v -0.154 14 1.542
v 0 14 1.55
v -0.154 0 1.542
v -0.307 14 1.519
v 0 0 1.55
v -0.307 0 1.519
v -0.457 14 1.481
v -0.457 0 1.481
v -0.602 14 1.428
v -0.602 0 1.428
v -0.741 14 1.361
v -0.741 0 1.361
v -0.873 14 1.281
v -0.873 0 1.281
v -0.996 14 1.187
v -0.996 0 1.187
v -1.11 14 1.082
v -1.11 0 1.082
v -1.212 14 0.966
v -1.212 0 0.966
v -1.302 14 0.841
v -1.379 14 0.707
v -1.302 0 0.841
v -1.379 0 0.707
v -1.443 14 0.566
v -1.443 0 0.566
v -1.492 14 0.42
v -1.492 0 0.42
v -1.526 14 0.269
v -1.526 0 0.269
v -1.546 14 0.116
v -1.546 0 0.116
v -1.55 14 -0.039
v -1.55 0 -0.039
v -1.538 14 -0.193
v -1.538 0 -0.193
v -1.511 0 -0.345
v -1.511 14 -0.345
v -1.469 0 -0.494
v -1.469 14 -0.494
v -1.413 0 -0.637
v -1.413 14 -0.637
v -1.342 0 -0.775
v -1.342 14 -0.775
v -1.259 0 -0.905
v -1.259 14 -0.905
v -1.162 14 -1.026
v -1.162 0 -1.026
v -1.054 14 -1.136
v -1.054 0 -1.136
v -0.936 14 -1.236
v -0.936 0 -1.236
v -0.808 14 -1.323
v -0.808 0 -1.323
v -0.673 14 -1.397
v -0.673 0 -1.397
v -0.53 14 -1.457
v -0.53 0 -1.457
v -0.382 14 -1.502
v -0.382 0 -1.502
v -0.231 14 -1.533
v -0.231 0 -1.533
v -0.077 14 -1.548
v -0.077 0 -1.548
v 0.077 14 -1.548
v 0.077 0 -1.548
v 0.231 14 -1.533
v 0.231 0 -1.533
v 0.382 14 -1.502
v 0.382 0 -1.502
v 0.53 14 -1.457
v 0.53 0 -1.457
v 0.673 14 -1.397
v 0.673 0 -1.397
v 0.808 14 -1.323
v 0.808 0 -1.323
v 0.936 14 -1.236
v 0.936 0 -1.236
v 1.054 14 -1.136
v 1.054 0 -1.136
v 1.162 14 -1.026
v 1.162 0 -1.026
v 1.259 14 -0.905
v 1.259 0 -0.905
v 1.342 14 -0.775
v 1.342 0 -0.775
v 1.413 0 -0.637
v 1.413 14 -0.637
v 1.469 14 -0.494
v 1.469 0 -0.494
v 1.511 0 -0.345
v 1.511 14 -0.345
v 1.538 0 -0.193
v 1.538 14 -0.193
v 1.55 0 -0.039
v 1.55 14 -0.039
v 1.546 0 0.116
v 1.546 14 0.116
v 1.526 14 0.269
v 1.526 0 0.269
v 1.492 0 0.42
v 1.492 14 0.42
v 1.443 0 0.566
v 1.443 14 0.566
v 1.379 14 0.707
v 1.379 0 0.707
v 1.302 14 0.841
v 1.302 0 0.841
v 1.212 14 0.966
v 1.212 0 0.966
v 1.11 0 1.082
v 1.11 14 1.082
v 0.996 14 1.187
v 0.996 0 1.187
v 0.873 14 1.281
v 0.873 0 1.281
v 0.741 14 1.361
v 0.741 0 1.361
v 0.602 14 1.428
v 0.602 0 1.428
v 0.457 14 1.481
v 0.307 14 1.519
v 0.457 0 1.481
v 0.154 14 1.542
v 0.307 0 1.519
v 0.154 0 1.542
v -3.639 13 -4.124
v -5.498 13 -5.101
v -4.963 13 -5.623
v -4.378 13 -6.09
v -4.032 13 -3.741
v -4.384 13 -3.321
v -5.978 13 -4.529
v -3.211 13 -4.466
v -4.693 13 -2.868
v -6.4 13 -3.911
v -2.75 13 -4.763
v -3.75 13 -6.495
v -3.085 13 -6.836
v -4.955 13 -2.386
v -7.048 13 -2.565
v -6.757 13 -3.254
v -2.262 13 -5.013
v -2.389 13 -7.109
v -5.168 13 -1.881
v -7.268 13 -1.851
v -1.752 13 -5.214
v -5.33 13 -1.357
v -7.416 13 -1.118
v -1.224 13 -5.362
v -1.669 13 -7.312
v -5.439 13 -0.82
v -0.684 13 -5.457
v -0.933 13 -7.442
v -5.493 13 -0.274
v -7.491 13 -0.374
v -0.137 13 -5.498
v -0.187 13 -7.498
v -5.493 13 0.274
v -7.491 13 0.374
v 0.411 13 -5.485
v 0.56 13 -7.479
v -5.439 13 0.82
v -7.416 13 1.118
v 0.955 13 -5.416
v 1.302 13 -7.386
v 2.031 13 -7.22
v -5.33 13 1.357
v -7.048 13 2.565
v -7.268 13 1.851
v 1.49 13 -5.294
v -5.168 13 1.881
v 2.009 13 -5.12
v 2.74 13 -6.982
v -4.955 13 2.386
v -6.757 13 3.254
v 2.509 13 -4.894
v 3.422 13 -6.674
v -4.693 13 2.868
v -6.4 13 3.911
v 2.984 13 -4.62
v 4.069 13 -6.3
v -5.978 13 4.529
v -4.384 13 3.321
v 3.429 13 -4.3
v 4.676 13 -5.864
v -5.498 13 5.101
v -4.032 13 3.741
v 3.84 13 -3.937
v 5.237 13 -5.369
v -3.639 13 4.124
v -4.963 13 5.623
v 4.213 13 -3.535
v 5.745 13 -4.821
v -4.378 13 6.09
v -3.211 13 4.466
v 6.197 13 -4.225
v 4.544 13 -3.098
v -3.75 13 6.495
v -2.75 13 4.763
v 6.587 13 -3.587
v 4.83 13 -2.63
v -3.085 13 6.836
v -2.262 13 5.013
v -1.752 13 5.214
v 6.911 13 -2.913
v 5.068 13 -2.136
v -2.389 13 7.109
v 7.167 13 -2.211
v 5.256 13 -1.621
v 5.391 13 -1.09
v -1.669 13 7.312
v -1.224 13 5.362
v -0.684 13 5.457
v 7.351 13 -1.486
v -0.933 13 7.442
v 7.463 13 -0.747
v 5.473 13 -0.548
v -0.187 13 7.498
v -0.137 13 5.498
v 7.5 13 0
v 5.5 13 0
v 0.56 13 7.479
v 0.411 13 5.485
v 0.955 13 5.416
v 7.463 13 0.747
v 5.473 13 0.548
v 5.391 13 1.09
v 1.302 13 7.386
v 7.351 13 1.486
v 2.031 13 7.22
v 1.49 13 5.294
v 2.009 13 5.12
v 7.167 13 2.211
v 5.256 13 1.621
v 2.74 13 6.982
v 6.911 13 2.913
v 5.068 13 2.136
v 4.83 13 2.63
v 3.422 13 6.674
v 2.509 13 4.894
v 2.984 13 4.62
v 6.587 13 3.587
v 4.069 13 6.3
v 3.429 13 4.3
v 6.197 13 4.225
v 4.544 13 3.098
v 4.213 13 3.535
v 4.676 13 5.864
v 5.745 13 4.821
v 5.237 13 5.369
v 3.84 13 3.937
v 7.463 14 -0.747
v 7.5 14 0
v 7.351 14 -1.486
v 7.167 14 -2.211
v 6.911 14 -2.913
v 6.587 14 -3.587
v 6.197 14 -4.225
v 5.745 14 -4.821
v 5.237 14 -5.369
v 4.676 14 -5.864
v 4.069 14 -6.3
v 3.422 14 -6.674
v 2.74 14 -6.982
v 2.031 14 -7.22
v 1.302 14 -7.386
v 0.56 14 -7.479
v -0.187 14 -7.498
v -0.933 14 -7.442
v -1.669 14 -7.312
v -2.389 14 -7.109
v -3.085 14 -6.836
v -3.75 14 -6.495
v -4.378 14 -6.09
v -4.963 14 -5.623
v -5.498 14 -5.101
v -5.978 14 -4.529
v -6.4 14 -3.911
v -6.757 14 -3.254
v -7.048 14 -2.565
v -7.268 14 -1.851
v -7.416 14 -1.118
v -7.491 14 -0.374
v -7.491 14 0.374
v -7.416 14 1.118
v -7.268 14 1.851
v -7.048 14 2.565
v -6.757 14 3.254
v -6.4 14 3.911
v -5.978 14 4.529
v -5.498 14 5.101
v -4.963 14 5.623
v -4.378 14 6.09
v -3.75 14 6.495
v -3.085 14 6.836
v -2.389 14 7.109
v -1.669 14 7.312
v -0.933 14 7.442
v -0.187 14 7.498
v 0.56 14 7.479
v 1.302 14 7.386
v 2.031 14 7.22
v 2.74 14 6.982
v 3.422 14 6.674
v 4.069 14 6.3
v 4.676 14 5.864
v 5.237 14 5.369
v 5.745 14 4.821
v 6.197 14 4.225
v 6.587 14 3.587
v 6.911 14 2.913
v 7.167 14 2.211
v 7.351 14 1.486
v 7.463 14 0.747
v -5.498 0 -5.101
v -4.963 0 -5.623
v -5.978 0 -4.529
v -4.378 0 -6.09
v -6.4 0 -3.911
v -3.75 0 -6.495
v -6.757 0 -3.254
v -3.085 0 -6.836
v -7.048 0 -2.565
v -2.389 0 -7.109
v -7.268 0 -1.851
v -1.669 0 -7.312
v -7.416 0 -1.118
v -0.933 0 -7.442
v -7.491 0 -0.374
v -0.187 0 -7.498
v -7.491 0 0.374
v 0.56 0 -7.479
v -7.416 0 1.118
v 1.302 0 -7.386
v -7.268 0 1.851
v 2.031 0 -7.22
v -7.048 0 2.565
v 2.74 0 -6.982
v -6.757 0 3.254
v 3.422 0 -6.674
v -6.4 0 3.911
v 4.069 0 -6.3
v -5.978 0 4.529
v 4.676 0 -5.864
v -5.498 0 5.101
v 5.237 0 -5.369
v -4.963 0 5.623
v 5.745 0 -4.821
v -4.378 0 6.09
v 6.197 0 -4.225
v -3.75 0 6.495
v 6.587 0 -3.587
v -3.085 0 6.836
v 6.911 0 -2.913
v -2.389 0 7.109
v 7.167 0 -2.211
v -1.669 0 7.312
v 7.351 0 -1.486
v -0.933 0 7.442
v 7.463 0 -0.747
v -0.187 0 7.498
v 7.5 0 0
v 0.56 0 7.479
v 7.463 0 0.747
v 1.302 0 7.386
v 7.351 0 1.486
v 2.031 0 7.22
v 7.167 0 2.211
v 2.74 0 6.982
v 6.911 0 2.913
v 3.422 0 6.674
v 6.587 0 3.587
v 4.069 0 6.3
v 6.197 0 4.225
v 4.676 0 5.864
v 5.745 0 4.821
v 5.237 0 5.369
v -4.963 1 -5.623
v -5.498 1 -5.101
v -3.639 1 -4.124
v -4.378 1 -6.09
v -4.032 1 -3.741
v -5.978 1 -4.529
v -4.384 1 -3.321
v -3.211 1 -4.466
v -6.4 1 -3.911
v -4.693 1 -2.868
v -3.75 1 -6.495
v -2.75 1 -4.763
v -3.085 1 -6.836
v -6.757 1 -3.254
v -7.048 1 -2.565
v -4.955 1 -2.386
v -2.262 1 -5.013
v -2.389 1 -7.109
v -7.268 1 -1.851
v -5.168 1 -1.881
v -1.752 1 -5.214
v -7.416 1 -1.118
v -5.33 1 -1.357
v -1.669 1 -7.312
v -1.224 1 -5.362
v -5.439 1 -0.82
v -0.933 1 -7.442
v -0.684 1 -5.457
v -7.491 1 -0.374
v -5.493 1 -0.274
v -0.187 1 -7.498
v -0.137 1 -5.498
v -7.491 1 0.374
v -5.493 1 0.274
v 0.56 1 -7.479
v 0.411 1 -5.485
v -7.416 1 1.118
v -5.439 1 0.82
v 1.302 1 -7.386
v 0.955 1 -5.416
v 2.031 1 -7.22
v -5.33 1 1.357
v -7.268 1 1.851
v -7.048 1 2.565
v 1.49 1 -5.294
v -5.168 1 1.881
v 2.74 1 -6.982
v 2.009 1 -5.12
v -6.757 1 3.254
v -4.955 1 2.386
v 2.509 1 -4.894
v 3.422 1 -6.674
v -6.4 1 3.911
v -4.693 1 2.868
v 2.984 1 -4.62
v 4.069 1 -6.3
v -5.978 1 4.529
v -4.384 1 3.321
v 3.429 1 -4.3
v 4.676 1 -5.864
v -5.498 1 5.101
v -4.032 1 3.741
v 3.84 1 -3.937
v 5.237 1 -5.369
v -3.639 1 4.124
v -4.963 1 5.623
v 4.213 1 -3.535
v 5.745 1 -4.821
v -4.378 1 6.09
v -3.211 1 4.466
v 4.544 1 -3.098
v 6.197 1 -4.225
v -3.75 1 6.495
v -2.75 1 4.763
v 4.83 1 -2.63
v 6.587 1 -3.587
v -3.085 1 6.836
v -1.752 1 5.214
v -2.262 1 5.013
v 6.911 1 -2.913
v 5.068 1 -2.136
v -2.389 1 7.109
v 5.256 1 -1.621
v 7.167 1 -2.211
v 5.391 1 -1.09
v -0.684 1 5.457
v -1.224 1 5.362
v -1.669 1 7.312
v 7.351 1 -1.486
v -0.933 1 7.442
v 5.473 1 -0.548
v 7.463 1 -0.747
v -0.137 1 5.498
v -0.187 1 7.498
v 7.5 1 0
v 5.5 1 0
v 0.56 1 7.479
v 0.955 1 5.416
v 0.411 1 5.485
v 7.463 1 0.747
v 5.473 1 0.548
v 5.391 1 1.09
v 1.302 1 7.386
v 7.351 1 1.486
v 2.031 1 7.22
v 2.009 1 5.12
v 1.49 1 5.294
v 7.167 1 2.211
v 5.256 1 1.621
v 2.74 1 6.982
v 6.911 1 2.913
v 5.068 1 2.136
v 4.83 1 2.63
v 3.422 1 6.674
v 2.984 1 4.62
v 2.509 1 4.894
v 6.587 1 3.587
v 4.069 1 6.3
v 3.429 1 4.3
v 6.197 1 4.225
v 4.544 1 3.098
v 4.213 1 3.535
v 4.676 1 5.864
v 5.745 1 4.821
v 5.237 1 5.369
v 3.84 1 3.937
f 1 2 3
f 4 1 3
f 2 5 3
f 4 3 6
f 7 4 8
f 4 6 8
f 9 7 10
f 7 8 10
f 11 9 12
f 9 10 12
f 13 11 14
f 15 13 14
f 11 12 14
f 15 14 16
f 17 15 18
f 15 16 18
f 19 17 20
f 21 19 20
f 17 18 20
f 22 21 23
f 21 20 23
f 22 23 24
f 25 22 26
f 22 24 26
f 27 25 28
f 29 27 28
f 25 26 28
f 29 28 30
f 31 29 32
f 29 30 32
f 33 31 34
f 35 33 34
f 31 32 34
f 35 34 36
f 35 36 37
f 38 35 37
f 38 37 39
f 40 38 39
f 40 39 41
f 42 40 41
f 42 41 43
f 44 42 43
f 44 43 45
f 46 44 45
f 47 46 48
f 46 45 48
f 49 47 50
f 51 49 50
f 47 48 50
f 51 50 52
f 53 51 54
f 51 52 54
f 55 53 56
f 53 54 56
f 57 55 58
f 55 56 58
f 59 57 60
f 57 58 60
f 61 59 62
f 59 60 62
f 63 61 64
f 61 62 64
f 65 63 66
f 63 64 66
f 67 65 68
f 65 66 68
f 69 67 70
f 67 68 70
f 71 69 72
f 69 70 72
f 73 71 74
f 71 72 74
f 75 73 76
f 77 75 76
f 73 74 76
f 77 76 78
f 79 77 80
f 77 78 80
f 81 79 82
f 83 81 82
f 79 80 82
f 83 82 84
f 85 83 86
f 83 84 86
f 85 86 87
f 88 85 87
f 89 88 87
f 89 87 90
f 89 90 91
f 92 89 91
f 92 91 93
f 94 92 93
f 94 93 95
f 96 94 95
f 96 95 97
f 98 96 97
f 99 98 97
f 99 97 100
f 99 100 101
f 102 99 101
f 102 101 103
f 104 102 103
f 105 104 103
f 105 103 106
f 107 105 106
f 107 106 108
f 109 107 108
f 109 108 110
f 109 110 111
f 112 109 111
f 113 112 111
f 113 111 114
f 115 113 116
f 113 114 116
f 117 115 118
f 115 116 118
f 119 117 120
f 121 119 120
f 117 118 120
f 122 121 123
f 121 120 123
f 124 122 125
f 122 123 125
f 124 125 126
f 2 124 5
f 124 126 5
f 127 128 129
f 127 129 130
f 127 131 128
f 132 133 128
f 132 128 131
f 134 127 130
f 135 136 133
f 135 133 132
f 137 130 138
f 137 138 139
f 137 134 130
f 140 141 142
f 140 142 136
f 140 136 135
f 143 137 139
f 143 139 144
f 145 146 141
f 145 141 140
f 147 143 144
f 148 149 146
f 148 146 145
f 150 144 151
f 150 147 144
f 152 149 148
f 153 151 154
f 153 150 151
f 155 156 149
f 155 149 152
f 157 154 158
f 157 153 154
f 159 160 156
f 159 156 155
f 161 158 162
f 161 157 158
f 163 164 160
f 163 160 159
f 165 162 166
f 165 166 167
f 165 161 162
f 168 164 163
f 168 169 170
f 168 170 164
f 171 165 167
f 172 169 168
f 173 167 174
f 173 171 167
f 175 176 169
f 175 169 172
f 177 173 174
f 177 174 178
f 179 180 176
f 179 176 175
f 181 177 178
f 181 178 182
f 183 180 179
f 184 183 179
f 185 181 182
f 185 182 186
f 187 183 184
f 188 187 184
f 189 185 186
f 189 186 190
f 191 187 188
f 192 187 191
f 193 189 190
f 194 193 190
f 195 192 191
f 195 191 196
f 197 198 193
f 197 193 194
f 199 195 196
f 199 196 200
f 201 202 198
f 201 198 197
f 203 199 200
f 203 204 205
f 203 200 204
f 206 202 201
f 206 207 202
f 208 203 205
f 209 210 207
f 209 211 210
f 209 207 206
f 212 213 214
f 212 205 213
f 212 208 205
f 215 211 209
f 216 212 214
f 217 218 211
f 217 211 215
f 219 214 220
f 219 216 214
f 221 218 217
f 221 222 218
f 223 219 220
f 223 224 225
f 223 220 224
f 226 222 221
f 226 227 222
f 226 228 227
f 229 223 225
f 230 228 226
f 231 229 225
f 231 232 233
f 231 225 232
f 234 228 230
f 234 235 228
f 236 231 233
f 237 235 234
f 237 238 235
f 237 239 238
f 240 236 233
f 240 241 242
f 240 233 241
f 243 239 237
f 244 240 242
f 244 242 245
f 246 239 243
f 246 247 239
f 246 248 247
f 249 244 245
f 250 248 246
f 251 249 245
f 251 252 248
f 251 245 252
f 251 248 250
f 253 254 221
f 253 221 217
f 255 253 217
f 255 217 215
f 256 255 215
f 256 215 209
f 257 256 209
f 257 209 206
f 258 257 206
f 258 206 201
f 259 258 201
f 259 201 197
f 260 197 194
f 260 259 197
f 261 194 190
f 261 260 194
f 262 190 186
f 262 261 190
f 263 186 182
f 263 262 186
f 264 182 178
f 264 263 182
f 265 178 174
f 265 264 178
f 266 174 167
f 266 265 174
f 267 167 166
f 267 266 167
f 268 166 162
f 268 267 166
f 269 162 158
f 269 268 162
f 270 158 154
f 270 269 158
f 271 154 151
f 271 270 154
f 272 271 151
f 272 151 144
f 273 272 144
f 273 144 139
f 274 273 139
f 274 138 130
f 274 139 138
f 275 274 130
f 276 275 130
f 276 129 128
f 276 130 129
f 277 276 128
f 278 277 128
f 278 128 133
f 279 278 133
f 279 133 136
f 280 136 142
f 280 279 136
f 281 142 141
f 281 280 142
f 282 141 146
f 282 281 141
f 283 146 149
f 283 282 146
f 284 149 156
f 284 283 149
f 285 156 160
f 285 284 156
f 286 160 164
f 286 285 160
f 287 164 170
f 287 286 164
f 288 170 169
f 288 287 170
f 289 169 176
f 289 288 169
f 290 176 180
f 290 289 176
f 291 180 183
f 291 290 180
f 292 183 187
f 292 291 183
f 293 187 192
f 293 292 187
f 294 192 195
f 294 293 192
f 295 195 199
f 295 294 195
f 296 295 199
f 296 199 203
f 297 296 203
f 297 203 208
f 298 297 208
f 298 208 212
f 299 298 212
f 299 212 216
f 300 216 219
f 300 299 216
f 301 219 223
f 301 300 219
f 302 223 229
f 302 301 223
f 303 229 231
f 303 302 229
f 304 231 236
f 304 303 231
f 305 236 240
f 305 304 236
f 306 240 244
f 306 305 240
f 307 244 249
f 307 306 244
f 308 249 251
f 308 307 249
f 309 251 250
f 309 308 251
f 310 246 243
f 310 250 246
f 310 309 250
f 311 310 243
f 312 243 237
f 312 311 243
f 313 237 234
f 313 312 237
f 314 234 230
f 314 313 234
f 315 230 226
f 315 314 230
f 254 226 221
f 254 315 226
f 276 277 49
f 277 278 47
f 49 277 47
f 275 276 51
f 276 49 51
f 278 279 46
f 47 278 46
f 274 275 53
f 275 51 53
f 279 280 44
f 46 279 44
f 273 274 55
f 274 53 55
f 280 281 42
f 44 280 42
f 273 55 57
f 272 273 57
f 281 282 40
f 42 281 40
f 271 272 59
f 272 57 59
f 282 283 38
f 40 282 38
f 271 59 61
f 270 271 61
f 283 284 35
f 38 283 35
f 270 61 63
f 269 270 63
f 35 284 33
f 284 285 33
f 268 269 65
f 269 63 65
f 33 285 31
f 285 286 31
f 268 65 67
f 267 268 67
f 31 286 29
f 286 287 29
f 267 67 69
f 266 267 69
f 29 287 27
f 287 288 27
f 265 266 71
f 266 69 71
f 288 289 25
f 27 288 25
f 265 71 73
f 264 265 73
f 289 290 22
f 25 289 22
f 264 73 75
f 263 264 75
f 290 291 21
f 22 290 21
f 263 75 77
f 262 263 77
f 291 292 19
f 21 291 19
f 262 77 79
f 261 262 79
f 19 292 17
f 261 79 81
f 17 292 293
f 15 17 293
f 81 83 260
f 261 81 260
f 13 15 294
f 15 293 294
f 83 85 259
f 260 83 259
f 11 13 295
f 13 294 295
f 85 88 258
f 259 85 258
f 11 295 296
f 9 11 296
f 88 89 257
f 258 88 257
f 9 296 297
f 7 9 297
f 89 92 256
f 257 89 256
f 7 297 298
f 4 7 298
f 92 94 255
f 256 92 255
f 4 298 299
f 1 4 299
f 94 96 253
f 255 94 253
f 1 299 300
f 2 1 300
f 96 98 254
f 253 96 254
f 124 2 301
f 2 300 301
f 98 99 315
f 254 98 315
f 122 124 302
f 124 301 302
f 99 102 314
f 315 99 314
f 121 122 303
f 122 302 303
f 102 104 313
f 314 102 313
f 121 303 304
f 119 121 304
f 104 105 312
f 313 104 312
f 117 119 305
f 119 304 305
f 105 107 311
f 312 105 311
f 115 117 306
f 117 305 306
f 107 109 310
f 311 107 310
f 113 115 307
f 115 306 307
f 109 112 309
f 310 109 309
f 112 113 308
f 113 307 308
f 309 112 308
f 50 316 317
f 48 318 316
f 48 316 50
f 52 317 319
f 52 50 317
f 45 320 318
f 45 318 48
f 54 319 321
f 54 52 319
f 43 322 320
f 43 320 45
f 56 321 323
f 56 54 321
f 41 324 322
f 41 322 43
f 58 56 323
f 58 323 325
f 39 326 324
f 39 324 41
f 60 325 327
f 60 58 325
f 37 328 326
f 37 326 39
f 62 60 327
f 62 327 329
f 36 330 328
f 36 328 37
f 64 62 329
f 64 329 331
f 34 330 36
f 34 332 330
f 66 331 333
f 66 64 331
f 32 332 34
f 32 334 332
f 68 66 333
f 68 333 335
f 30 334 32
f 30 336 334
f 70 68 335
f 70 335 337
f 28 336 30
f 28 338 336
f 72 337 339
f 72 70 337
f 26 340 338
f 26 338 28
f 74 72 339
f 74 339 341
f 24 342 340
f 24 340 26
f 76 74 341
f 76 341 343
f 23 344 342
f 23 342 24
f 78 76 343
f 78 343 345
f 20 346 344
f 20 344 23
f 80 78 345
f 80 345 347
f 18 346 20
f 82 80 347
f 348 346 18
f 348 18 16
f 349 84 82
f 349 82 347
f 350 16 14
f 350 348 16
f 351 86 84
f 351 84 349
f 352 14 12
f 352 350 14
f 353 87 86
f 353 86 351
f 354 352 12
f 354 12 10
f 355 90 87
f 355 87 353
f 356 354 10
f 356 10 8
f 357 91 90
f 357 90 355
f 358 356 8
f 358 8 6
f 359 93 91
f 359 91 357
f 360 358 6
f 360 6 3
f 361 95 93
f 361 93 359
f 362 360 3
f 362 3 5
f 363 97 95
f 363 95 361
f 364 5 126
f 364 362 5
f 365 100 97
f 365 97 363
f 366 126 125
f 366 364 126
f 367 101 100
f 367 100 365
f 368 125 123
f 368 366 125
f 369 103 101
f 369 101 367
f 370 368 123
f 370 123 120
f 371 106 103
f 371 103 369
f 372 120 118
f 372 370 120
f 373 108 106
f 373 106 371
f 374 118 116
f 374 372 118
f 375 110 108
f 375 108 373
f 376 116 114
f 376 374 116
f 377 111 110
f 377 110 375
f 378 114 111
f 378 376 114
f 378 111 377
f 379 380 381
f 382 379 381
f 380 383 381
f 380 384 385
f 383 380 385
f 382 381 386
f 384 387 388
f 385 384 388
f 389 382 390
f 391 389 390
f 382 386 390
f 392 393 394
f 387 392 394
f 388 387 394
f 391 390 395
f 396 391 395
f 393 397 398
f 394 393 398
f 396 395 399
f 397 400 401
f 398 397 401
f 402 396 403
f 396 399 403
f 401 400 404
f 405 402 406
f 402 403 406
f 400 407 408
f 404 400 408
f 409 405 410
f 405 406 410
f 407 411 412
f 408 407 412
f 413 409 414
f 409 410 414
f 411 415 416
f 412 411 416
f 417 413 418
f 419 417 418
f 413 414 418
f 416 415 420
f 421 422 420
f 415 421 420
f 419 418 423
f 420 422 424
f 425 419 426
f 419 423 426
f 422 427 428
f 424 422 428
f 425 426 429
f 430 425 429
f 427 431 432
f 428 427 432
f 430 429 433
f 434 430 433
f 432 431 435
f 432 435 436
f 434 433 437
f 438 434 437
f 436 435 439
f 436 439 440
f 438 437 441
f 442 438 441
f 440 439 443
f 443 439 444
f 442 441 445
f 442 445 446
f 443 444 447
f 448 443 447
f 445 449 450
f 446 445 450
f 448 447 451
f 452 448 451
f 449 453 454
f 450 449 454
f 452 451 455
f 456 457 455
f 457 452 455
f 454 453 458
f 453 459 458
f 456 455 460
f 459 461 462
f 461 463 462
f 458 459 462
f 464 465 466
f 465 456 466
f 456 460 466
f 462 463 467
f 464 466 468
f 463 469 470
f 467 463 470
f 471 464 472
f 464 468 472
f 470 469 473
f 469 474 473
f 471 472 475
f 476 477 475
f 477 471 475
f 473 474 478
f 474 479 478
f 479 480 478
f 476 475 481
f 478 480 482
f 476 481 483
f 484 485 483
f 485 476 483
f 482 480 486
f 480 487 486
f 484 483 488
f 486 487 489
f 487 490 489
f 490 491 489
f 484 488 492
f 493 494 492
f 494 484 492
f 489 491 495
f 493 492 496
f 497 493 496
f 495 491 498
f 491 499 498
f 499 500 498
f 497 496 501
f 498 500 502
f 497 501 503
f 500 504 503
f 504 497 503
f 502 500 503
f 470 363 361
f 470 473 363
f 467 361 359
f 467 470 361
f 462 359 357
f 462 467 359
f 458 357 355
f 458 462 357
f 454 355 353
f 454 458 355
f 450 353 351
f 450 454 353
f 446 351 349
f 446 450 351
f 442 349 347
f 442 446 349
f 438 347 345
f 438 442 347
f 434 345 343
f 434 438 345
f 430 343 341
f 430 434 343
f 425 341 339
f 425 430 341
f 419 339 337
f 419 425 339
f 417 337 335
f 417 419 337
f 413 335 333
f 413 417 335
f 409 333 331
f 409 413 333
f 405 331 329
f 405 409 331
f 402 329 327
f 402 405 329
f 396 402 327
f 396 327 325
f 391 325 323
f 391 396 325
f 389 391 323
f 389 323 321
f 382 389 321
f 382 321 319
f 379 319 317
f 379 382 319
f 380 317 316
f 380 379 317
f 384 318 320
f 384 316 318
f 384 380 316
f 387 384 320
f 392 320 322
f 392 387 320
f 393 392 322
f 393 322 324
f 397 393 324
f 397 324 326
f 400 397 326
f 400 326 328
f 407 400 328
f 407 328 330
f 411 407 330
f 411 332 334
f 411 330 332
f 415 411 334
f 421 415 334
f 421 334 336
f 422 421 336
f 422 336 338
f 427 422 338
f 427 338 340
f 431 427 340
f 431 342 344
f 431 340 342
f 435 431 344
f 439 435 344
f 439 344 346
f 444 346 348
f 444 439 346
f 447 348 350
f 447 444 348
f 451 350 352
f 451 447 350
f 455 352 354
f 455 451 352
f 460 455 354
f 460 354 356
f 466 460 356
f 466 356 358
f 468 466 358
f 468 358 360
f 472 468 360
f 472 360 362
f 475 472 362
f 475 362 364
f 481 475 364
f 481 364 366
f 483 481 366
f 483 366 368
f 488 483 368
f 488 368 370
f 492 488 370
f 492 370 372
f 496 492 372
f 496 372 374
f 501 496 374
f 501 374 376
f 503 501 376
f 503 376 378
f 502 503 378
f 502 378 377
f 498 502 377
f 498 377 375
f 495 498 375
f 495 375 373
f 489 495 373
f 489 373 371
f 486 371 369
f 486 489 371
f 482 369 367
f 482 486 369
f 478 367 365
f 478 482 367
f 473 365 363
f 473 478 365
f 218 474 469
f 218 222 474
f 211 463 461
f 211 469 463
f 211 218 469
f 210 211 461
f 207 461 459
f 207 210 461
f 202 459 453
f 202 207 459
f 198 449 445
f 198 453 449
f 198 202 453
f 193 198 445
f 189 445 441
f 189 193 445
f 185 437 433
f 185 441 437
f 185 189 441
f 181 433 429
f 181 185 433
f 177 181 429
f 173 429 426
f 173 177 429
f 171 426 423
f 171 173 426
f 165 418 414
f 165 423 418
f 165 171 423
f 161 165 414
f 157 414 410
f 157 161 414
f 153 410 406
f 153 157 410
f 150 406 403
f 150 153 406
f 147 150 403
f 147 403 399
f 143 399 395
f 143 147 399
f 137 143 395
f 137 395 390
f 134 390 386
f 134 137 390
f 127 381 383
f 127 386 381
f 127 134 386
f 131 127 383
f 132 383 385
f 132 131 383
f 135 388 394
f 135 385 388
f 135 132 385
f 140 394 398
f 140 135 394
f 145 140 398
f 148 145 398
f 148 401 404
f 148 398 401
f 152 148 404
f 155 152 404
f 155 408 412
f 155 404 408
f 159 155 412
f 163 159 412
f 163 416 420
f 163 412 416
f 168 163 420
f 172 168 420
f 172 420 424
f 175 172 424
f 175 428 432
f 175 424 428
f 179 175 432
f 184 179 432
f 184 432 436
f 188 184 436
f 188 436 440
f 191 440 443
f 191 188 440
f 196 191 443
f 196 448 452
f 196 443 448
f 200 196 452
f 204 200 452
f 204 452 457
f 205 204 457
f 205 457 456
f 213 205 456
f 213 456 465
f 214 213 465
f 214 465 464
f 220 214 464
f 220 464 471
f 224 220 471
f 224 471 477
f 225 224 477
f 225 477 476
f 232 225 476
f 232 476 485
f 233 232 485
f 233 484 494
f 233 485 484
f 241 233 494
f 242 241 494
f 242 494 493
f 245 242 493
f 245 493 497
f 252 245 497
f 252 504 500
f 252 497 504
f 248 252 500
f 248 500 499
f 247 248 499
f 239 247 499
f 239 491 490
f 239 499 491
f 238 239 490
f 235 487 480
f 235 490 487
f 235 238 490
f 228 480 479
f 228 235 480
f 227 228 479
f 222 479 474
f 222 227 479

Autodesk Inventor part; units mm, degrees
ref_plane "YZ Plane" through (0, 0, 0) normal (1, 0, 0) x (0, 1, 0)
ref_plane "XZ Plane" through (0, 0, 0) normal (0, 1, 0) x (-1, 0, 0)
ref_plane "XY Plane" through (0, 0, 0) normal (0, 0, 1) x (1, 0, 0)
sketch "Esquisse2" plane through (0, 0, 0) normal (0, 0, 1) x (1, 0, 0)
  line L0 (0, 17.0922) -> (0, -5.3775) construction
  line L1 (0, 0) -> (7.5, 0)
  line L2 (7.5, 0) -> (7.5, 1)
  line L3 (7.5, 1) -> (5.5, 1)
  line L4 (5.5, 1) -> (5.5, 13)
  line L5 (5.5, 13) -> (7.5, 13)
  line L6 (7.5, 13) -> (7.5, 14)
  line L7 (7.5, 14) -> (0, 14)
  line L8 (0, 14) -> (0, 0)
  dimension "d8" = 15
  dimension "d9" = 1
  dimension "d10" = 1
  dimension "d11" = 14
  dimension "d12" = 2
  dimension "d20" = 7.5
revolve "Révolution1" add sketch "Esquisse2" angle 360 about axis through (0, 17.0922, 0) along (0, -1, 0)
sketch "Esquisse3" plane through (0, 14, 0) normal (0, 1, 0) x (1, 0, 0)
  point P0 (0, 0)
  point P1 (0, 0)
hole "Perçage1" at (0, 14, 0) direction (0, -1, 0) diameter 3.1 end through all clearance for "Vis d'assemblage à six pans creux" size "M3" standard "Profil M métrique ANSI"
equation "\"d20\" = 0.5 * d8"
properties part number "poulie courroie"
